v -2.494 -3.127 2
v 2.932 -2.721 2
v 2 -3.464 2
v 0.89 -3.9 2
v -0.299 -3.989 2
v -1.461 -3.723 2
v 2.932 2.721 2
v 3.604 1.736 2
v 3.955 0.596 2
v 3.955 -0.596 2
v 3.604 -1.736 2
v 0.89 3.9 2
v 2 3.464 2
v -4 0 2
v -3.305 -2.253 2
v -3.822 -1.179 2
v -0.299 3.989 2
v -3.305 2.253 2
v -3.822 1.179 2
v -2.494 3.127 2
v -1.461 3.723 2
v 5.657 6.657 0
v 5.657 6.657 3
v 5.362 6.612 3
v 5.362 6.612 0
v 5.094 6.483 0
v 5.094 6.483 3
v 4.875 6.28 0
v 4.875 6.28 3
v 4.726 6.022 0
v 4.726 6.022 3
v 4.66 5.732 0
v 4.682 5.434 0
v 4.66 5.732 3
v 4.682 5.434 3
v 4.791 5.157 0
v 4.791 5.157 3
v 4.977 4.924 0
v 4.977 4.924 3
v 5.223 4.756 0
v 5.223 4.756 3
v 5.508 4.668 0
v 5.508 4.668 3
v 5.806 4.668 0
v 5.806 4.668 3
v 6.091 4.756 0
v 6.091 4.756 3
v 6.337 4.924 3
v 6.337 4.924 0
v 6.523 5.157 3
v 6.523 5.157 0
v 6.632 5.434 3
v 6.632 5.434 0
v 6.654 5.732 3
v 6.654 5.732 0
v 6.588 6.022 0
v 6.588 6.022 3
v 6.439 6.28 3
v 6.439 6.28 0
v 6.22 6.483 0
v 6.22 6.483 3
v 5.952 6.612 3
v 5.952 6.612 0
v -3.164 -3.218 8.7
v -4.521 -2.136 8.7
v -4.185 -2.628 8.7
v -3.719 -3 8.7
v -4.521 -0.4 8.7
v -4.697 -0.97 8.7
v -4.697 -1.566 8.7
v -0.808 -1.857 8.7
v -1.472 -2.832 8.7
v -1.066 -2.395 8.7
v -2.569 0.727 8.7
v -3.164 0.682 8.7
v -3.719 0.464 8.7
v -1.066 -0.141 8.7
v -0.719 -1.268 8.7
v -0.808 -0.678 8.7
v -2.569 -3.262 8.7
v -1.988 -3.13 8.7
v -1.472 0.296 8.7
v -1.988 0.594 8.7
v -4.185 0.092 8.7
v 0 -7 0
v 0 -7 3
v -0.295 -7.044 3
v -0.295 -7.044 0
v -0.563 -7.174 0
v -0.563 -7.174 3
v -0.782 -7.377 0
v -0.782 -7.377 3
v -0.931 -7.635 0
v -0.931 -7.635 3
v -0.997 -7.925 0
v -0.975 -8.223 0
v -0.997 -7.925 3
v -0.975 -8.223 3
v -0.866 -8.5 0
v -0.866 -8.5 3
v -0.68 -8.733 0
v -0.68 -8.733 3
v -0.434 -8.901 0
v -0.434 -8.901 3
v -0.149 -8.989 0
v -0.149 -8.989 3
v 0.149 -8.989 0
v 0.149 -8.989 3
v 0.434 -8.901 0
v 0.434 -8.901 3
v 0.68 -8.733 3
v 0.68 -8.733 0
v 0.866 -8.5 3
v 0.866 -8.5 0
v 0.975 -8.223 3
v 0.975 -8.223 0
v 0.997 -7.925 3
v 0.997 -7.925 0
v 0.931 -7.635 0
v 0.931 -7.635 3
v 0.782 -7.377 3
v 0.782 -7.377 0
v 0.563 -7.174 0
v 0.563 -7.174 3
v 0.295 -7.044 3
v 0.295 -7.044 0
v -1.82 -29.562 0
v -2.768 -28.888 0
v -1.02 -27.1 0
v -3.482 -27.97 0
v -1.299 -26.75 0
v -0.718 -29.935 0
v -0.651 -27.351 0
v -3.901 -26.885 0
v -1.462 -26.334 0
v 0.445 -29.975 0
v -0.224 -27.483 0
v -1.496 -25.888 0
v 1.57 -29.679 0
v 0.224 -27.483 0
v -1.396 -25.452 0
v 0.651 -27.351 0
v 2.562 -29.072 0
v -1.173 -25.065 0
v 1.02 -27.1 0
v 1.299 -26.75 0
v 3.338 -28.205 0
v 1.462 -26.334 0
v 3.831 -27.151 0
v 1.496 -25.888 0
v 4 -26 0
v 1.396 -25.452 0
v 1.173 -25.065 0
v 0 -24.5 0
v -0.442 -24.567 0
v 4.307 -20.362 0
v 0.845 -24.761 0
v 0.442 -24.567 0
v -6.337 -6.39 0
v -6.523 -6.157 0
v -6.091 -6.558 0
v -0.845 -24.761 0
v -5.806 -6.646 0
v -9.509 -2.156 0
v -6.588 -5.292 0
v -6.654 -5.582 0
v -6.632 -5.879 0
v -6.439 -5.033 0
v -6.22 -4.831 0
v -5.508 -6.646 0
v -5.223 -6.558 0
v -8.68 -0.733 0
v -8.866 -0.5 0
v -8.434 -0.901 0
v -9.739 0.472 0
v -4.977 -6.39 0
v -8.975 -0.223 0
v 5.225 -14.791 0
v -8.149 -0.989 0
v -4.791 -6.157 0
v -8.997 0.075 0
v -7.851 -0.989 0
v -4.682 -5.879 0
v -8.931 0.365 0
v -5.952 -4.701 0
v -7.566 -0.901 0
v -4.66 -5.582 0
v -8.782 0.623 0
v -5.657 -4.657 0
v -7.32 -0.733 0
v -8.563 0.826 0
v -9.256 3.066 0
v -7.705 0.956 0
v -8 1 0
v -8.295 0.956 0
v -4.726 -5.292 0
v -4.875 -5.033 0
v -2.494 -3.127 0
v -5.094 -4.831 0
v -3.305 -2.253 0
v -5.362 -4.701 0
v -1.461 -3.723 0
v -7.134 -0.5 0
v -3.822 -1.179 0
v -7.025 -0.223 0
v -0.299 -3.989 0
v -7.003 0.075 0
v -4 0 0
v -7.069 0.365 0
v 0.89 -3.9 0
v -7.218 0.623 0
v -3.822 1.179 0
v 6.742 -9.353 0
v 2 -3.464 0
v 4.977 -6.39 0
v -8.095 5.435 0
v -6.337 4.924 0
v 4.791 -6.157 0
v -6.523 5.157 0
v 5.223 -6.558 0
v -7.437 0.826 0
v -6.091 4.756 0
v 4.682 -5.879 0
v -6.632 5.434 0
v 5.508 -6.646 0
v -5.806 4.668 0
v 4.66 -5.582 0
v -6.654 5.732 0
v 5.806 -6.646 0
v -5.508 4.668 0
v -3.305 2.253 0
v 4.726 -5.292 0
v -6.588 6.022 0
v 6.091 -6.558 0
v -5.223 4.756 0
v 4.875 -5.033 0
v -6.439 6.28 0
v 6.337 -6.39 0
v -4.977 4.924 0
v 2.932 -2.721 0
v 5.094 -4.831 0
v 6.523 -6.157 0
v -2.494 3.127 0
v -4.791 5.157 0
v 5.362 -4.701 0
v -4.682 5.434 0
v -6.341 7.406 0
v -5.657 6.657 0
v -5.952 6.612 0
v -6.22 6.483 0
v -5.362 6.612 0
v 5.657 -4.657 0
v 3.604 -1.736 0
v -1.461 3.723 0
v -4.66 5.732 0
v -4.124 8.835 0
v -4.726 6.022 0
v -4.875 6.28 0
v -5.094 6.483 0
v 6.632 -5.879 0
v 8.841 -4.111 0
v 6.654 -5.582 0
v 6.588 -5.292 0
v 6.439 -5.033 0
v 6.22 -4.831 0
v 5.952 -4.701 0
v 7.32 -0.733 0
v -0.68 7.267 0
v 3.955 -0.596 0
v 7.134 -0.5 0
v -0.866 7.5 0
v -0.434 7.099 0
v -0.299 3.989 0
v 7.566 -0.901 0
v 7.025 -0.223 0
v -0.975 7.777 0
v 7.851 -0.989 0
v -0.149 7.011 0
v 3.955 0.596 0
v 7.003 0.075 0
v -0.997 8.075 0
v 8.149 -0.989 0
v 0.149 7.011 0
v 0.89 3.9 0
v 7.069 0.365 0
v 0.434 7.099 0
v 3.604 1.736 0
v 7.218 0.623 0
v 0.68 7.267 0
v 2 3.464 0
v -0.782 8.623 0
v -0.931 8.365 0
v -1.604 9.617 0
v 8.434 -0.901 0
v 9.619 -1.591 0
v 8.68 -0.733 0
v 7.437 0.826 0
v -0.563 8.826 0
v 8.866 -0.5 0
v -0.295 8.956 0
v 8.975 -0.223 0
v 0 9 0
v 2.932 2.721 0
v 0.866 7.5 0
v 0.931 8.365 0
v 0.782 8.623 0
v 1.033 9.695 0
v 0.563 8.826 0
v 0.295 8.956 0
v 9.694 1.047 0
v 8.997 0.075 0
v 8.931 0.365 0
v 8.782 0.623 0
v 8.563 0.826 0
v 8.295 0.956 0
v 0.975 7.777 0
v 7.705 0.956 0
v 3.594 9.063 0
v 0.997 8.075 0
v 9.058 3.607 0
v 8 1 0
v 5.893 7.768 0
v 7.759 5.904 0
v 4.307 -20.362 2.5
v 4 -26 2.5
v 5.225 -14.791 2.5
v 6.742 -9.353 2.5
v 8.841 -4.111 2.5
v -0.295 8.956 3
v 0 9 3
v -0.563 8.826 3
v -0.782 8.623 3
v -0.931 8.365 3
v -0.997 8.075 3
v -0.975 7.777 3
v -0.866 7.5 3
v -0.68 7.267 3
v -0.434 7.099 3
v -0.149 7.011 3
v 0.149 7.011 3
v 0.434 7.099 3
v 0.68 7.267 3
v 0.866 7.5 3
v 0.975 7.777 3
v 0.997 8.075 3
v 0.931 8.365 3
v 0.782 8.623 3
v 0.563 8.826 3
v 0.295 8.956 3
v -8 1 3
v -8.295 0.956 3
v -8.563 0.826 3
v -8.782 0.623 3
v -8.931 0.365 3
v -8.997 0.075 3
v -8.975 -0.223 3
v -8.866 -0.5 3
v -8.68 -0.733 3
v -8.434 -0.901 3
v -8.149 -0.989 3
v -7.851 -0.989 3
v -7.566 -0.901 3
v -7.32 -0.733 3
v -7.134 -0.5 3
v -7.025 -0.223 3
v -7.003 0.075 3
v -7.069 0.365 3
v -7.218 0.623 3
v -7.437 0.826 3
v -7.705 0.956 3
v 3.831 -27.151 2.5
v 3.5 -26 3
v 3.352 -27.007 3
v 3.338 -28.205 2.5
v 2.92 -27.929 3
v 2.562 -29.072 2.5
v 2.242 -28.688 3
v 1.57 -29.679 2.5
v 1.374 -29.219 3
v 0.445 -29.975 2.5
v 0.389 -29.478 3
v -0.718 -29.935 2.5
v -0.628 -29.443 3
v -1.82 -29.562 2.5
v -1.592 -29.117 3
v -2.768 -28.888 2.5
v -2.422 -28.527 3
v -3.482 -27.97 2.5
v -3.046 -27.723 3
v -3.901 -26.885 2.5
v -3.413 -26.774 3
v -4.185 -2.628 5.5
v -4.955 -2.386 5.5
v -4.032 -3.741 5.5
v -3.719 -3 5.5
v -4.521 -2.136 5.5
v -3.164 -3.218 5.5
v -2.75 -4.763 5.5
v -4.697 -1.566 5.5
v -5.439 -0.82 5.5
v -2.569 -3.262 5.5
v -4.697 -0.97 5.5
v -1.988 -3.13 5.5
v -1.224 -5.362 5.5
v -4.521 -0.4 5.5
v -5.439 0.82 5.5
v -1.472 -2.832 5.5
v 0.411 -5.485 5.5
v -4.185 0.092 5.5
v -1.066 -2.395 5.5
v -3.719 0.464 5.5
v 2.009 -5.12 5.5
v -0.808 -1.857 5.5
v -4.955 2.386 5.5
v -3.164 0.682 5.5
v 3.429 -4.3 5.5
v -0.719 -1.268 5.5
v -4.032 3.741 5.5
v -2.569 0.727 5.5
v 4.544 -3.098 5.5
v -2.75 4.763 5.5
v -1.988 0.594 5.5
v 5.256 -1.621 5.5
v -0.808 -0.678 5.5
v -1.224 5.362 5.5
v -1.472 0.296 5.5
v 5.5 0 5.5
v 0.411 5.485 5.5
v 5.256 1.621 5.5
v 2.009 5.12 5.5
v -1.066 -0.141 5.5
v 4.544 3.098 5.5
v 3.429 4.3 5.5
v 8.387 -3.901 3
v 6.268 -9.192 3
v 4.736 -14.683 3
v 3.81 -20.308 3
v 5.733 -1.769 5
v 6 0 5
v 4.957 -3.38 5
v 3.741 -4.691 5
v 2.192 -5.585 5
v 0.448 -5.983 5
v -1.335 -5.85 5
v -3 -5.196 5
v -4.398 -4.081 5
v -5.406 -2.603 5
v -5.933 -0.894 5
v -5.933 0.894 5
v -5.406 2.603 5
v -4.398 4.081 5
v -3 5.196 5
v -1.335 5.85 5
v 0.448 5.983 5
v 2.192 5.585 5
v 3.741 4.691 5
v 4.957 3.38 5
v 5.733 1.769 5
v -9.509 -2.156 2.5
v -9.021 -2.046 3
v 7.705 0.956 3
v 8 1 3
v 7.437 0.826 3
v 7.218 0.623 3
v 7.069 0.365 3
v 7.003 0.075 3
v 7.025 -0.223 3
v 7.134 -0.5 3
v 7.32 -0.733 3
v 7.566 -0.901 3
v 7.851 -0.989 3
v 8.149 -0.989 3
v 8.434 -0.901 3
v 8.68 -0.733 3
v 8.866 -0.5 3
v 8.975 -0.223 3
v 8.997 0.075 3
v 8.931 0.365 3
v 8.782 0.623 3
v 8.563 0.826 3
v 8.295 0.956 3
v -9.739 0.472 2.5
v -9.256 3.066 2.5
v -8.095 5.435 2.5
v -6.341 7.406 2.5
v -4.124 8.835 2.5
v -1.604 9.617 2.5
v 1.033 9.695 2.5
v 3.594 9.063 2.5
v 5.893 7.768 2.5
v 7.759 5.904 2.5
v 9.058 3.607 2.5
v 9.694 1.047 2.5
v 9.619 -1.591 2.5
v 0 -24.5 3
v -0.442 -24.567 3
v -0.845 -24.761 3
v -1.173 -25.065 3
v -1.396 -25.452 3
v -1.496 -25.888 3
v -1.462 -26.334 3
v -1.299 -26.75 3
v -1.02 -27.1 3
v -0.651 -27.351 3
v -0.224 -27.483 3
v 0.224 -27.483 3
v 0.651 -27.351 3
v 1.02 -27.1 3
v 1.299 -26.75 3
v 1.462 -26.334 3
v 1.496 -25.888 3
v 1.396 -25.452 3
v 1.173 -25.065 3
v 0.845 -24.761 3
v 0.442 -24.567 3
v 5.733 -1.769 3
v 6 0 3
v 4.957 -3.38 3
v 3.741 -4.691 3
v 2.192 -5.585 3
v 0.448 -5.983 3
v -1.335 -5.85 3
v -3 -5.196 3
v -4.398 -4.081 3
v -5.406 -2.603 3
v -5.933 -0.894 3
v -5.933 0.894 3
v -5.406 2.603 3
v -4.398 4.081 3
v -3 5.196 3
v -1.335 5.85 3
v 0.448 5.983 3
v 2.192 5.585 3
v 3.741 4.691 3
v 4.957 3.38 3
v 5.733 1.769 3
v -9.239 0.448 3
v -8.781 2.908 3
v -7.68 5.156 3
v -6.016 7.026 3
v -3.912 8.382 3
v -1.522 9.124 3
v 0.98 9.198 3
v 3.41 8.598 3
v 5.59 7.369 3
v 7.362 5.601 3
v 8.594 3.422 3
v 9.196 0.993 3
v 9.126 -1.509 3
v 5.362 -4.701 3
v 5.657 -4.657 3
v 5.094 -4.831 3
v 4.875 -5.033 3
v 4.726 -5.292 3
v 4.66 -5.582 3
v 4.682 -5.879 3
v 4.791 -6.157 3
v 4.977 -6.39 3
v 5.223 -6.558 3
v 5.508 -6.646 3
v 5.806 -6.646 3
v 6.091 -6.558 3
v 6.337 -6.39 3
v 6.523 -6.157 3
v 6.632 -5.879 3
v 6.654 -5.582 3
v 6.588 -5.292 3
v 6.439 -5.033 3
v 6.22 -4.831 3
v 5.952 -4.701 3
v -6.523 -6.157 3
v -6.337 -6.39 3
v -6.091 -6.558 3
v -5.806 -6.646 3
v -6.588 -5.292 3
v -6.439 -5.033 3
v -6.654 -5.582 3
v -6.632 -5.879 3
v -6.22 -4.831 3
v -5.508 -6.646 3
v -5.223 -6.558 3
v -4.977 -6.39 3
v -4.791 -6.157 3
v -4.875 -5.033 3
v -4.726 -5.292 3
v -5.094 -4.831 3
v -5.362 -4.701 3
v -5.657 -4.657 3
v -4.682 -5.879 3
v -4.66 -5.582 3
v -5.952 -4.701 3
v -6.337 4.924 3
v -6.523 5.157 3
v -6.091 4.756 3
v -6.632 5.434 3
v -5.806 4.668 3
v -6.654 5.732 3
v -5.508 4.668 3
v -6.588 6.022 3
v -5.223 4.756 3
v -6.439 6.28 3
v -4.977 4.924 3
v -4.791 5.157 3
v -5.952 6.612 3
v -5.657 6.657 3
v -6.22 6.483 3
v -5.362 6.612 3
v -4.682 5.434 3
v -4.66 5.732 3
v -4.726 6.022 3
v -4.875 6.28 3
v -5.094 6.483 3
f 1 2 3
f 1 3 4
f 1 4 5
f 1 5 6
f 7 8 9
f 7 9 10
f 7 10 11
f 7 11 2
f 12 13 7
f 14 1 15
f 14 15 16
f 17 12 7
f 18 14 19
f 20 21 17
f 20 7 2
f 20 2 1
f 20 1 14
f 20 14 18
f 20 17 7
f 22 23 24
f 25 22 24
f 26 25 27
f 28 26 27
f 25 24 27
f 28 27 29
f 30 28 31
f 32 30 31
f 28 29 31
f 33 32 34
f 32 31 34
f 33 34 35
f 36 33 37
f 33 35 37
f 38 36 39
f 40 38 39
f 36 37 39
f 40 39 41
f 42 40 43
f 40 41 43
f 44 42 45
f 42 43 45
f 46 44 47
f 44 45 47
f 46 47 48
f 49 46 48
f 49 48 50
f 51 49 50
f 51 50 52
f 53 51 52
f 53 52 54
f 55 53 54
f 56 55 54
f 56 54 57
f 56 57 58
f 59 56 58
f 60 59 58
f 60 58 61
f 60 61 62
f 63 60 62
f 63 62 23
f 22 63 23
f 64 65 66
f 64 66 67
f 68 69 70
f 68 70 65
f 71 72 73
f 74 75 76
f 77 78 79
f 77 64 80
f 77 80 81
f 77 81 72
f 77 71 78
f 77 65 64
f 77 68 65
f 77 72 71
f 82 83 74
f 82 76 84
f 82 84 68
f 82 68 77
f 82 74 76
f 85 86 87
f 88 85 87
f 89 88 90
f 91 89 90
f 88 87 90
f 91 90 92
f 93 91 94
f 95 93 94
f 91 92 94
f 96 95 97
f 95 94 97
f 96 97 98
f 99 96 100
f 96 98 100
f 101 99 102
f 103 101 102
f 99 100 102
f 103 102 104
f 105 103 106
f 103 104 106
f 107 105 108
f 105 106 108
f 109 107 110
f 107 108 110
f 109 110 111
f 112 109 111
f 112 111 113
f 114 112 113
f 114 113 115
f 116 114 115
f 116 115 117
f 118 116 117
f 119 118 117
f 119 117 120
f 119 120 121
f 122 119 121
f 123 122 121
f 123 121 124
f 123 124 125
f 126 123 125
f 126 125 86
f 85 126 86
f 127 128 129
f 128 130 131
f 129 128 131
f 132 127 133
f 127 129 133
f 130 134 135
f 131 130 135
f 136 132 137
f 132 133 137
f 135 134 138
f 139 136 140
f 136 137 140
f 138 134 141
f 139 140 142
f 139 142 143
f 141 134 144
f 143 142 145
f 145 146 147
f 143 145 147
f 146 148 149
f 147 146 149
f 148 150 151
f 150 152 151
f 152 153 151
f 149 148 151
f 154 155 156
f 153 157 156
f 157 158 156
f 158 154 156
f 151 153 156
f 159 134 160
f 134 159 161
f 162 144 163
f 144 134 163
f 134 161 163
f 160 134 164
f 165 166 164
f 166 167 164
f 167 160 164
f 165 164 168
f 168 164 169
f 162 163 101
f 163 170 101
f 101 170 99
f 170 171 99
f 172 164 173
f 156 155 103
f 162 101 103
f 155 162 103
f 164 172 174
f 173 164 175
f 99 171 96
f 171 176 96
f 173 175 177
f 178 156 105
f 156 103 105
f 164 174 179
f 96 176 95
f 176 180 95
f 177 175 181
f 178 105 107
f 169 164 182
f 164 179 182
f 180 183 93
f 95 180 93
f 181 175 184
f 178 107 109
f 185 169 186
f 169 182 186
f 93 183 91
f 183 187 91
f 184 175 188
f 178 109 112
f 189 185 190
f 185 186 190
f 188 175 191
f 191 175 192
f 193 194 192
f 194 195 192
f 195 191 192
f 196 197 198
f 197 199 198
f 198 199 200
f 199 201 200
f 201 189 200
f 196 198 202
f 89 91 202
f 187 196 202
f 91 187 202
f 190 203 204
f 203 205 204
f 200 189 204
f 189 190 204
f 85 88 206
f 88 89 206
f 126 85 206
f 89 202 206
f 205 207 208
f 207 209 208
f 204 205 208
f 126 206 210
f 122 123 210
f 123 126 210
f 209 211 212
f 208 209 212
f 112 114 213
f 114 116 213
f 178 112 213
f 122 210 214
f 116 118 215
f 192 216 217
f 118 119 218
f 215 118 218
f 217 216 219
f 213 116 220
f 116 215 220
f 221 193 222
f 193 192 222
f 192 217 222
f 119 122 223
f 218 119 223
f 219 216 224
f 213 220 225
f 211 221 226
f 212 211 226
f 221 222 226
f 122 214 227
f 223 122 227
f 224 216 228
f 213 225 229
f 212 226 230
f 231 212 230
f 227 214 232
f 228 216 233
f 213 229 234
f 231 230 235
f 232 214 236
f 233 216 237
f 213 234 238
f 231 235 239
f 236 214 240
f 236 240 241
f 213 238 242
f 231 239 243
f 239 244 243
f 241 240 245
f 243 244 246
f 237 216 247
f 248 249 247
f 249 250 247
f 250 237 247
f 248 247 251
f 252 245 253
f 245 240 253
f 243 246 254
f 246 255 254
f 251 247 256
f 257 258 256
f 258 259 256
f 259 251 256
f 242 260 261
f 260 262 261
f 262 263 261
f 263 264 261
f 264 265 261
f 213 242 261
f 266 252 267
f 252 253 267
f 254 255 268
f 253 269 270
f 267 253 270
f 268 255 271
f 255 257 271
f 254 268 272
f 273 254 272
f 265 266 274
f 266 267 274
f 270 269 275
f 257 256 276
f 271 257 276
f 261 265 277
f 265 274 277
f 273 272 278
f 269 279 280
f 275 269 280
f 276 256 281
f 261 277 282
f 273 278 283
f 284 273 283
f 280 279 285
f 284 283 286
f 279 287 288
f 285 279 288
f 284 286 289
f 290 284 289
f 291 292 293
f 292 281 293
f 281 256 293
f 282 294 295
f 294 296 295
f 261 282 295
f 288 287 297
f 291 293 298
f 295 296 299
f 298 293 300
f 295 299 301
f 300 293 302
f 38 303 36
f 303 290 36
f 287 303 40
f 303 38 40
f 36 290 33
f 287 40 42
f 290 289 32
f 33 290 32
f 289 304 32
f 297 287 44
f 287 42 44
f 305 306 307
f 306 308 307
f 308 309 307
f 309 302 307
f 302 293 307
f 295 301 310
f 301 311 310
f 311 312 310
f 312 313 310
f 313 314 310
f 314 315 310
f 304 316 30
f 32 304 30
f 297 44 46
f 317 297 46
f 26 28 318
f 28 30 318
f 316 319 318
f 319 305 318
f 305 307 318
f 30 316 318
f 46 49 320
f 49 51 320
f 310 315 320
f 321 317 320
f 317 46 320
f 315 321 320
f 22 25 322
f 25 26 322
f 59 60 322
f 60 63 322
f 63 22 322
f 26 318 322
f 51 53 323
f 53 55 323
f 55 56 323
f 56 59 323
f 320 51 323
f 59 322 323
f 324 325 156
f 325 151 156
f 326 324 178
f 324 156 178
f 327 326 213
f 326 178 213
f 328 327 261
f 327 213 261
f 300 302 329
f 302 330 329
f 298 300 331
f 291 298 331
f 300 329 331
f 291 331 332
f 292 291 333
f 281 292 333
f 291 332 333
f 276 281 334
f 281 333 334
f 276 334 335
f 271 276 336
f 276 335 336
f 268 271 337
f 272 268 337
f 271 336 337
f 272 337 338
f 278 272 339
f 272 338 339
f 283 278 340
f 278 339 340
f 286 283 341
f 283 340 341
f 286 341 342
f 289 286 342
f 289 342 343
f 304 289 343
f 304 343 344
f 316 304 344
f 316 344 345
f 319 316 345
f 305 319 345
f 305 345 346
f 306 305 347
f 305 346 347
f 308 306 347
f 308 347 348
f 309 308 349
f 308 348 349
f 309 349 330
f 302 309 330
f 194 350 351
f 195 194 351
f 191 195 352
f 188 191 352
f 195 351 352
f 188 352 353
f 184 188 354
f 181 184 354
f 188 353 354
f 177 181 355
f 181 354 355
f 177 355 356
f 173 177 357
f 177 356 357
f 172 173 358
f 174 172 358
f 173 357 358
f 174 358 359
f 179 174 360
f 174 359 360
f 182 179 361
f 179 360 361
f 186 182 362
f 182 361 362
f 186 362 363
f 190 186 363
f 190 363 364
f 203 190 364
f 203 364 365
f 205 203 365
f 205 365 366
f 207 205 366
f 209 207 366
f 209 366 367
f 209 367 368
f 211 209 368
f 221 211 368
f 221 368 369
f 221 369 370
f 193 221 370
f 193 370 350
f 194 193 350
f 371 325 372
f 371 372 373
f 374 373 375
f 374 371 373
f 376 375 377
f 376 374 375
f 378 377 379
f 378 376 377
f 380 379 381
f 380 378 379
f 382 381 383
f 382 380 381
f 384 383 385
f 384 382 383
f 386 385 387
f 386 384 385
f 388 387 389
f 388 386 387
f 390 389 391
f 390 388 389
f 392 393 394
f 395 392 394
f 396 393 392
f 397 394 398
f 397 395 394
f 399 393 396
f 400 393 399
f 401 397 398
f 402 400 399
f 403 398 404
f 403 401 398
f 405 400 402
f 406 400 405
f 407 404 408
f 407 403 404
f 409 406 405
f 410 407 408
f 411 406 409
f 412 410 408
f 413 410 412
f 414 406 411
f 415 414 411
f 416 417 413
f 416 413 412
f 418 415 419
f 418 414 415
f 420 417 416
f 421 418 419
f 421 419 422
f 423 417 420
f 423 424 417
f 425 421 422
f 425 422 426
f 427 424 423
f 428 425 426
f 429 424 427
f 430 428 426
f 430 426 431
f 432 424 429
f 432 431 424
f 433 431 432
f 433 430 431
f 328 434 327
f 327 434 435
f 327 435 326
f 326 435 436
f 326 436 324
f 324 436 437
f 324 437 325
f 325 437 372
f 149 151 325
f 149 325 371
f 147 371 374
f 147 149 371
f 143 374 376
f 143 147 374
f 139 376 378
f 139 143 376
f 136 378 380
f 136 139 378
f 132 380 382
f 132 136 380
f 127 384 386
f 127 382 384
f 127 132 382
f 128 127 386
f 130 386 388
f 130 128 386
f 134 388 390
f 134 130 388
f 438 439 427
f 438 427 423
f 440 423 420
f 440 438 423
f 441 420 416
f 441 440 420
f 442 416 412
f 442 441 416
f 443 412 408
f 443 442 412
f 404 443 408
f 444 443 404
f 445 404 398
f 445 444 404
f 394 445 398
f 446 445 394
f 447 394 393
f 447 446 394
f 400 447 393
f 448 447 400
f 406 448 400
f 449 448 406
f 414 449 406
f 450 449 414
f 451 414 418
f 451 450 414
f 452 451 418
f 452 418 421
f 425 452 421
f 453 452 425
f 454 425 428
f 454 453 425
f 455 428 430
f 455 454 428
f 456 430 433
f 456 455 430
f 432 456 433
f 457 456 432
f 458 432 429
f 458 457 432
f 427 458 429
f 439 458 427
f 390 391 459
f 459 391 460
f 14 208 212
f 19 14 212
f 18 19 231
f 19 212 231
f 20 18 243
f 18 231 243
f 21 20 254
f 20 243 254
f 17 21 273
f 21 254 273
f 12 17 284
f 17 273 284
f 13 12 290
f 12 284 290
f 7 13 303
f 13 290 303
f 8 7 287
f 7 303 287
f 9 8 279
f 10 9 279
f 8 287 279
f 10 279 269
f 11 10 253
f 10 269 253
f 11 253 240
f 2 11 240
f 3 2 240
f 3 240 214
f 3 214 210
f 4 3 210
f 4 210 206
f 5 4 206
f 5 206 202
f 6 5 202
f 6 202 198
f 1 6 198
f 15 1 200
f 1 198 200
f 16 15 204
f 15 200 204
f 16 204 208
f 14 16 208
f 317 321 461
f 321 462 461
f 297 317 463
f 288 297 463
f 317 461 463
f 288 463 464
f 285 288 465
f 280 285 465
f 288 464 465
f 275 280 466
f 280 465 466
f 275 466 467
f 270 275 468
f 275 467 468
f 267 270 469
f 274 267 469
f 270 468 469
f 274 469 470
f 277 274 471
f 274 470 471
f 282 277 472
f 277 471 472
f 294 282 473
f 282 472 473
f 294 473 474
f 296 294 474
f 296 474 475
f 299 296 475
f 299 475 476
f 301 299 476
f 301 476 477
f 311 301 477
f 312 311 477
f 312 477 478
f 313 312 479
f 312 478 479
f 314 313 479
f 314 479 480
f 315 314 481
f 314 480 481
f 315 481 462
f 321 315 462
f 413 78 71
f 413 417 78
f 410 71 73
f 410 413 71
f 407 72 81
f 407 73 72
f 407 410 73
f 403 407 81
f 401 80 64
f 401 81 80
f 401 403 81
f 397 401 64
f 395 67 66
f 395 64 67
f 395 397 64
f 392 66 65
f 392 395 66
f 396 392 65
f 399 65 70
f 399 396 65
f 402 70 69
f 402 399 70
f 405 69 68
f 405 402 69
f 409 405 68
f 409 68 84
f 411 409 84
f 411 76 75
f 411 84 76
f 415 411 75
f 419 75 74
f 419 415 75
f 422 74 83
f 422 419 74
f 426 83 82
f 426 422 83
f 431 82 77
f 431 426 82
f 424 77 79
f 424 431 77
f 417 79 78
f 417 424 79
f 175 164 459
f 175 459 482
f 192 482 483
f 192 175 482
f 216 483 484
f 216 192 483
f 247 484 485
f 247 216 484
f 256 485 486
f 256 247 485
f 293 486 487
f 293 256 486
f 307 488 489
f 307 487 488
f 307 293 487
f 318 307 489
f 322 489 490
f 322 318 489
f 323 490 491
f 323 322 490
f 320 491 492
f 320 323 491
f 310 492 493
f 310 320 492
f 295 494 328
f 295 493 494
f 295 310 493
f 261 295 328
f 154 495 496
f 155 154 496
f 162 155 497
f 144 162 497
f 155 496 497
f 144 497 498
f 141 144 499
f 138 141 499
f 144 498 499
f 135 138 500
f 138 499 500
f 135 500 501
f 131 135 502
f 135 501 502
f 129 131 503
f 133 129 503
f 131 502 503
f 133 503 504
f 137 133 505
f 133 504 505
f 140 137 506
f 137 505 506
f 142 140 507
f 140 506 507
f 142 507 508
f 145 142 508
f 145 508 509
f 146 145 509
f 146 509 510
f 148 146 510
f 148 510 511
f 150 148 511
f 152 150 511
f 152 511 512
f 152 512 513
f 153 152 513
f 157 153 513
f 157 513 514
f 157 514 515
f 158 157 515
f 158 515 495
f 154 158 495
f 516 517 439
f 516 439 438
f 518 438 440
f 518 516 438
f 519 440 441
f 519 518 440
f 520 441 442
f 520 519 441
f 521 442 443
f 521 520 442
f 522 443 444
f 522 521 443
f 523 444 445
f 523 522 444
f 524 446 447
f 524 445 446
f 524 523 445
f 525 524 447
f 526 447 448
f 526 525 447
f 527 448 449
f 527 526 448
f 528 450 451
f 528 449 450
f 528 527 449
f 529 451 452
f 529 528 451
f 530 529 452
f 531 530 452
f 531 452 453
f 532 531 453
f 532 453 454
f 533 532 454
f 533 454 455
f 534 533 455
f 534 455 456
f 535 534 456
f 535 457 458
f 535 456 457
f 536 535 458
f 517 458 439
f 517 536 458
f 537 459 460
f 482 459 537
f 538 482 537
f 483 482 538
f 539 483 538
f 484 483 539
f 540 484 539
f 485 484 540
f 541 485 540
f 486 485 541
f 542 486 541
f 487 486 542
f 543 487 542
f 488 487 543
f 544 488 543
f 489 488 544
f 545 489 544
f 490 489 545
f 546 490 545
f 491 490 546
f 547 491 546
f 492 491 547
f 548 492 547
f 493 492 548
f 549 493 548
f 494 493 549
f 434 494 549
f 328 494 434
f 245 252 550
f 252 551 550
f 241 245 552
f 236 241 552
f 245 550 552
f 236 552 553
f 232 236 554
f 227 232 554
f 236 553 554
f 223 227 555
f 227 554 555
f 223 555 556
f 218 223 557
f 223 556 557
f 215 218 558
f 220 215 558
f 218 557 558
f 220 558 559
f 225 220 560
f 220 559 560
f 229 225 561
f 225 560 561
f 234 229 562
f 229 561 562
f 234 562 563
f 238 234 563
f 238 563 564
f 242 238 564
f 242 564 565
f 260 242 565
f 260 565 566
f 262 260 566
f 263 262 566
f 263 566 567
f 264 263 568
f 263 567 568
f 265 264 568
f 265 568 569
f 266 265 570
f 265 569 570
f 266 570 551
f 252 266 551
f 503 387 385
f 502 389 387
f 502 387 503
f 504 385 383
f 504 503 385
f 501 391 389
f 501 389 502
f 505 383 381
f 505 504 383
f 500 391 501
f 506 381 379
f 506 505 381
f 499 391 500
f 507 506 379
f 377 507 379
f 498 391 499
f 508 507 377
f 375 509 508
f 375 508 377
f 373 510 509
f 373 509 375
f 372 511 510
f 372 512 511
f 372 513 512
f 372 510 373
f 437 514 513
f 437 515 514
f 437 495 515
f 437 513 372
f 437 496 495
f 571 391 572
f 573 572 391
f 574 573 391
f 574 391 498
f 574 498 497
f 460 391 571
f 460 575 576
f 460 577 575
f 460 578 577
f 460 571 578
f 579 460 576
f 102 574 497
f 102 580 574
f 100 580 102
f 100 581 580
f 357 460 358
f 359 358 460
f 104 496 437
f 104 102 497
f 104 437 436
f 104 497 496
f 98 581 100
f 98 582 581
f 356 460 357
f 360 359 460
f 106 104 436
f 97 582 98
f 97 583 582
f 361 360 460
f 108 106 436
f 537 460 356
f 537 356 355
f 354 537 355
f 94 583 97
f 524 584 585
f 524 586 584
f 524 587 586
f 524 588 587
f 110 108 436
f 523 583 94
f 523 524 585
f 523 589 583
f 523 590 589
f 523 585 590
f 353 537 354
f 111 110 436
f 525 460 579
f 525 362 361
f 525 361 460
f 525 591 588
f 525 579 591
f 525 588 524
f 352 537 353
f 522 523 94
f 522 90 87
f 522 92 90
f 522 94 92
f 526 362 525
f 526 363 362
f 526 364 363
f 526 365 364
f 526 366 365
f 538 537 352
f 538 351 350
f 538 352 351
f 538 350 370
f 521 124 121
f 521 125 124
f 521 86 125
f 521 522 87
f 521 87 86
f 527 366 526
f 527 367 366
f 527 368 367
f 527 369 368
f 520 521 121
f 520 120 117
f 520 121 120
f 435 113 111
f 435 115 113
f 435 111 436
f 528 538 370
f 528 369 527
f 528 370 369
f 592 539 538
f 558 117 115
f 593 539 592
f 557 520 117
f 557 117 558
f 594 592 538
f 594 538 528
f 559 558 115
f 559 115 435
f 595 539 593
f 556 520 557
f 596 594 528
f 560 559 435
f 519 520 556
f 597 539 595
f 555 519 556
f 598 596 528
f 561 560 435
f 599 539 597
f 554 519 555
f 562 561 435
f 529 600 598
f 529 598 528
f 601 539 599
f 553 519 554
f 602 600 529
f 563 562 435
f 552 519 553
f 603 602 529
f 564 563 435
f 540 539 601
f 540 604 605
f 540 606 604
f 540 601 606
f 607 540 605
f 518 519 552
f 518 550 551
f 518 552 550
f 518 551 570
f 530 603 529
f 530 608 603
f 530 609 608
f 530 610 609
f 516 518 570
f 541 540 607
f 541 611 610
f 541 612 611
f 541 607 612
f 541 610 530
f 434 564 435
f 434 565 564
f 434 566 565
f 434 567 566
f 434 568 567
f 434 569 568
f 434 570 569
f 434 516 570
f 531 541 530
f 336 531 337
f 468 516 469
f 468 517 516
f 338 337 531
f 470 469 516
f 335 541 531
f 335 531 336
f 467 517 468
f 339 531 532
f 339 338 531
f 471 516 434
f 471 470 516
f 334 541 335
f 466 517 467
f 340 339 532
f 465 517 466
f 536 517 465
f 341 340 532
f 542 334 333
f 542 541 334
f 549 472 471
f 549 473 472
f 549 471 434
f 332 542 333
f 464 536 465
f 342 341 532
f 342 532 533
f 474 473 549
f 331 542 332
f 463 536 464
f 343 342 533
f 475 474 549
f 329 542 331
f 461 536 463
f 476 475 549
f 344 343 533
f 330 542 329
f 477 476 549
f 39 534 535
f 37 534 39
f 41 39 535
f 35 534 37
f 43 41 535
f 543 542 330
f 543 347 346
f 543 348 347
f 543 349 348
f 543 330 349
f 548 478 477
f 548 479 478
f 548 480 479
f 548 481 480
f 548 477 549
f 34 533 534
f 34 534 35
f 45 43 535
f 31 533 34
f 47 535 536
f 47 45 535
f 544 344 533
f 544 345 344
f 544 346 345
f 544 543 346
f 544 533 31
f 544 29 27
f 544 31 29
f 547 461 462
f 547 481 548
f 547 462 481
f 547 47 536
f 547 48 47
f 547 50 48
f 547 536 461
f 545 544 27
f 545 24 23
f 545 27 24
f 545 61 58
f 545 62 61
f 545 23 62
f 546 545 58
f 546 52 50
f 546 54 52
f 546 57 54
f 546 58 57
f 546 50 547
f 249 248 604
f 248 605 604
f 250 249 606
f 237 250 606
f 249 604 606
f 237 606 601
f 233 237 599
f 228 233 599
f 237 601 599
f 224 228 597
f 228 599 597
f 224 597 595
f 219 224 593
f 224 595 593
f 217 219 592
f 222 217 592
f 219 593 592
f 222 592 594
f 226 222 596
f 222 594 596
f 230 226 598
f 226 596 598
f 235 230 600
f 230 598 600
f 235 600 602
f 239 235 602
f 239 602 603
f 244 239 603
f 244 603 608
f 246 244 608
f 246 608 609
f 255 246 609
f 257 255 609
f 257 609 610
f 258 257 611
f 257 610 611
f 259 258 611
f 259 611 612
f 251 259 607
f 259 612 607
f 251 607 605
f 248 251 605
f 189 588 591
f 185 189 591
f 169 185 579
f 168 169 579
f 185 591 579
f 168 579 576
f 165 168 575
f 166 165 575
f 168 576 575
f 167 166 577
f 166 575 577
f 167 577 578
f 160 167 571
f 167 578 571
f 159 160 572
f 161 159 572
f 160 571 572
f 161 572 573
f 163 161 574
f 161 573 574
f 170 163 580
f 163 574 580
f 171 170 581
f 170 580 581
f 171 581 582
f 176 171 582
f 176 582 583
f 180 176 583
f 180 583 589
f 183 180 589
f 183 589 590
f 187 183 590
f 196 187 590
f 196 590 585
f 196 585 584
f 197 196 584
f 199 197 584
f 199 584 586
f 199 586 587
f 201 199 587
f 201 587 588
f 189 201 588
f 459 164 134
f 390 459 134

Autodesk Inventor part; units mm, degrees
ref_plane "YZ Plane" through (0, 0, 0) normal (1, 0, 0) x (0, 1, 0)
ref_plane "XZ Plane" through (0, 0, 0) normal (0, 1, 0) x (-1, 0, 0)
ref_plane "XY Plane" through (0, 0, 0) normal (0, 0, 1) x (1, 0, 0)
sketch "スケッチ1" plane through (0, 0, 0) normal (0, 0, 1) x (1, 0, 0)
  line L0 (0, 0) -> (-2.7189, -1.2679) construction
  line L1 (0, 0) -> (0, -26) construction
  arc A0 (8.8407, -4.1114) -> (-9.5086, -2.1563) centre (0, 0) ccw
  arc A1 (-3.901, -26.8846) -> (4, -26) centre (0, -26) ccw
  arc A2 (8.8407, -4.1114) -> (4, -26) centre (55.9076, -26) ccw
  line L2 (-9.5086, -2.1563) -> (-3.901, -26.8846)
  line L3 (0, -26) -> (4, -26) construction
  circle A3 centre (0, 0) radius 8 construction
  point P0 (8, 0)
  point P1 (5.6569, 5.6569)
  point P2 (0, 8)
  point P3 (-5.6569, 5.6569)
  point P4 (-8, 0)
  point P5 (-5.6569, -5.6569)
  point P6 (0, -8)
  point P7 (5.6569, -5.6569)
  point P8 (0, -26)
  dimension "d38" = 16
  dimension "d2" = 3
  dimension "d4" = 26
  dimension "d6" = 9.75
  dimension "d7" = 4
  dimension "d11" = 360
  dimension "d37" = 65
extrude "押し出し1" add sketch "スケッチ1" along normal blind 3
sketch "スケッチ5" plane through (0, 0, 3) normal (0, 0, 1) x (1, 0, 0)
  circle A0 centre (0, 0) radius 6
  arc A1 (8.8407, -4.1114) -> (-9.5086, -2.1563) centre (0, 0) ccw construction
  dimension "d41" = 12
extrude "押し出し4" add sketch "スケッチ5" along normal blind 2.5
hole "穴1" at (8, 0, 0) at (5.6569, 5.6569, 0) at (0, 8, 0) at (-5.6569, 5.6569, 0) at (-8, 0, 0) at (-5.6569, -5.6569, 0) at (0, -8, 0) at (5.6569, -5.6569, 0) direction (0, 0, 1) diameter 2 end through all
hole "穴2" at (0, -26, 0) direction (0, 0, 1) diameter 3 end through all
sketch "スケッチ2" plane through (0, 0, 0) normal (0, 0, -1) x (-1, 0, 0)
  circle A0 centre (0, 0) radius 4
  dimension "d30" = 8
extrude "押し出し2" cut sketch "スケッチ2" against normal blind 2
sketch "スケッチ3" plane through (0, 0, 5.5) normal (0, 0, 1) x (1, 0, 0)
  circle A0 centre (-2.7189, -1.2679) radius 2
  point P0 (0, 0)
  dimension "d33" = 4
extrude "押し出し3" add sketch "スケッチ3" along normal blind 3.2
chamfer "面取り1" distance 0.5 angle 45 5 edges at (-6, 0, 5.5) (1.033, 9.6951, 3) (-6.7048, -14.5204, 3) (0.4451, -29.9752, 3) (5.2246, -14.7913, 3)
properties part number "COXA_ROLL_SERVO-OUTPUT"
